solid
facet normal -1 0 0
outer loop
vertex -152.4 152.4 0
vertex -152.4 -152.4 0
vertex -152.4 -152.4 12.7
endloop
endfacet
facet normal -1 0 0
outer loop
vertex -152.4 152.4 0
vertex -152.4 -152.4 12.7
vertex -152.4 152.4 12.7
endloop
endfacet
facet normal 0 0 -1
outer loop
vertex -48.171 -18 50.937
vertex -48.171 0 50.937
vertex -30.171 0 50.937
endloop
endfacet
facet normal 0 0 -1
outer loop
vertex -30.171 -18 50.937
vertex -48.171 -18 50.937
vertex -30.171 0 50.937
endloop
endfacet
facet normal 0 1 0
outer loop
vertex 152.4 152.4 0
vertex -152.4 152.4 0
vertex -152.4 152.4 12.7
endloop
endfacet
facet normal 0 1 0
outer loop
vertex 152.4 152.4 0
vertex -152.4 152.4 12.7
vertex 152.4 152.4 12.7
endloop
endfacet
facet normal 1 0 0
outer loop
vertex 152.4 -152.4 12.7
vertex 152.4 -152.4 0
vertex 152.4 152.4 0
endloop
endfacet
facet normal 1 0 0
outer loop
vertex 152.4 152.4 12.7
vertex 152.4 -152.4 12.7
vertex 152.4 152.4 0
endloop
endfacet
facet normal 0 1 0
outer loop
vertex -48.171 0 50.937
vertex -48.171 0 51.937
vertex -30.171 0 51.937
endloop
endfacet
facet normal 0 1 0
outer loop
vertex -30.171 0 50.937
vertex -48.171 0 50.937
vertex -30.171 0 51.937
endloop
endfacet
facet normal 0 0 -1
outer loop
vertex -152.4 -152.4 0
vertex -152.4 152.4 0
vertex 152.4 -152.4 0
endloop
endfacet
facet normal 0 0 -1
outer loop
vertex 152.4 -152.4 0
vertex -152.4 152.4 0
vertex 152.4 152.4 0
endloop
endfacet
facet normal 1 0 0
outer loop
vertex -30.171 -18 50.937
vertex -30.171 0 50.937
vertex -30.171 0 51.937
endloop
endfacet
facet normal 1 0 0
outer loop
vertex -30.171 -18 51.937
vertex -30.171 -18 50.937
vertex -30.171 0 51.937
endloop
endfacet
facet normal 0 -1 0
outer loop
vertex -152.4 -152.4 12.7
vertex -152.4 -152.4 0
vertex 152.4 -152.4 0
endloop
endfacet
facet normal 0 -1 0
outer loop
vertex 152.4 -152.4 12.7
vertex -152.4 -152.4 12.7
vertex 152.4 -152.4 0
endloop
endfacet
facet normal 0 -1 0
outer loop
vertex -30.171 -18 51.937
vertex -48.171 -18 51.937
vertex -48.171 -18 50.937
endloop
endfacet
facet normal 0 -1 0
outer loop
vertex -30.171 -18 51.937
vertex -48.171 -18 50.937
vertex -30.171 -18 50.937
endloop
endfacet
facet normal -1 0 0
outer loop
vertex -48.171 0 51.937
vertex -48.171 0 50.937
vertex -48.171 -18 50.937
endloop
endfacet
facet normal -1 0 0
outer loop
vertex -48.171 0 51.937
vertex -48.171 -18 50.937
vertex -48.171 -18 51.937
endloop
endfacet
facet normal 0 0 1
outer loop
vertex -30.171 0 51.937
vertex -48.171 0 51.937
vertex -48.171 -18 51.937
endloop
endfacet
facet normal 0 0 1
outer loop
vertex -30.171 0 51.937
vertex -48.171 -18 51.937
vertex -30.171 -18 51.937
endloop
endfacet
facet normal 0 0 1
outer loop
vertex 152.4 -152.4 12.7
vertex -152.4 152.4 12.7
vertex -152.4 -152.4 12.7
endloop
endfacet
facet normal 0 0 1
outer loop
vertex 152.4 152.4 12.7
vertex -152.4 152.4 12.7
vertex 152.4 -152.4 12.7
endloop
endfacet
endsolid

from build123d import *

# Parameters (mm, degrees)
F0_W     = 304.8
F0_H     = 304.8
F1_DEPTH = 12.7
F2_W     = 18
F2_H     = 1
F3_DEPTH = 18


with BuildPart() as f1:
    # F0 (on Top) → F1 (new body)
    with BuildSketch(Plane.XY):
        Rectangle(F0_W, F0_H)
    extrude(amount=F1_DEPTH)


with BuildPart() as f3:
    # F2 (on Front) → F3 (new body)
    with BuildSketch(Plane.XZ):
        with Locations((-39.170912, 51.437049)):
            Rectangle(F2_W, F2_H)
    extrude(amount=F3_DEPTH)


solid = Compound([f1.part, f3.part])
